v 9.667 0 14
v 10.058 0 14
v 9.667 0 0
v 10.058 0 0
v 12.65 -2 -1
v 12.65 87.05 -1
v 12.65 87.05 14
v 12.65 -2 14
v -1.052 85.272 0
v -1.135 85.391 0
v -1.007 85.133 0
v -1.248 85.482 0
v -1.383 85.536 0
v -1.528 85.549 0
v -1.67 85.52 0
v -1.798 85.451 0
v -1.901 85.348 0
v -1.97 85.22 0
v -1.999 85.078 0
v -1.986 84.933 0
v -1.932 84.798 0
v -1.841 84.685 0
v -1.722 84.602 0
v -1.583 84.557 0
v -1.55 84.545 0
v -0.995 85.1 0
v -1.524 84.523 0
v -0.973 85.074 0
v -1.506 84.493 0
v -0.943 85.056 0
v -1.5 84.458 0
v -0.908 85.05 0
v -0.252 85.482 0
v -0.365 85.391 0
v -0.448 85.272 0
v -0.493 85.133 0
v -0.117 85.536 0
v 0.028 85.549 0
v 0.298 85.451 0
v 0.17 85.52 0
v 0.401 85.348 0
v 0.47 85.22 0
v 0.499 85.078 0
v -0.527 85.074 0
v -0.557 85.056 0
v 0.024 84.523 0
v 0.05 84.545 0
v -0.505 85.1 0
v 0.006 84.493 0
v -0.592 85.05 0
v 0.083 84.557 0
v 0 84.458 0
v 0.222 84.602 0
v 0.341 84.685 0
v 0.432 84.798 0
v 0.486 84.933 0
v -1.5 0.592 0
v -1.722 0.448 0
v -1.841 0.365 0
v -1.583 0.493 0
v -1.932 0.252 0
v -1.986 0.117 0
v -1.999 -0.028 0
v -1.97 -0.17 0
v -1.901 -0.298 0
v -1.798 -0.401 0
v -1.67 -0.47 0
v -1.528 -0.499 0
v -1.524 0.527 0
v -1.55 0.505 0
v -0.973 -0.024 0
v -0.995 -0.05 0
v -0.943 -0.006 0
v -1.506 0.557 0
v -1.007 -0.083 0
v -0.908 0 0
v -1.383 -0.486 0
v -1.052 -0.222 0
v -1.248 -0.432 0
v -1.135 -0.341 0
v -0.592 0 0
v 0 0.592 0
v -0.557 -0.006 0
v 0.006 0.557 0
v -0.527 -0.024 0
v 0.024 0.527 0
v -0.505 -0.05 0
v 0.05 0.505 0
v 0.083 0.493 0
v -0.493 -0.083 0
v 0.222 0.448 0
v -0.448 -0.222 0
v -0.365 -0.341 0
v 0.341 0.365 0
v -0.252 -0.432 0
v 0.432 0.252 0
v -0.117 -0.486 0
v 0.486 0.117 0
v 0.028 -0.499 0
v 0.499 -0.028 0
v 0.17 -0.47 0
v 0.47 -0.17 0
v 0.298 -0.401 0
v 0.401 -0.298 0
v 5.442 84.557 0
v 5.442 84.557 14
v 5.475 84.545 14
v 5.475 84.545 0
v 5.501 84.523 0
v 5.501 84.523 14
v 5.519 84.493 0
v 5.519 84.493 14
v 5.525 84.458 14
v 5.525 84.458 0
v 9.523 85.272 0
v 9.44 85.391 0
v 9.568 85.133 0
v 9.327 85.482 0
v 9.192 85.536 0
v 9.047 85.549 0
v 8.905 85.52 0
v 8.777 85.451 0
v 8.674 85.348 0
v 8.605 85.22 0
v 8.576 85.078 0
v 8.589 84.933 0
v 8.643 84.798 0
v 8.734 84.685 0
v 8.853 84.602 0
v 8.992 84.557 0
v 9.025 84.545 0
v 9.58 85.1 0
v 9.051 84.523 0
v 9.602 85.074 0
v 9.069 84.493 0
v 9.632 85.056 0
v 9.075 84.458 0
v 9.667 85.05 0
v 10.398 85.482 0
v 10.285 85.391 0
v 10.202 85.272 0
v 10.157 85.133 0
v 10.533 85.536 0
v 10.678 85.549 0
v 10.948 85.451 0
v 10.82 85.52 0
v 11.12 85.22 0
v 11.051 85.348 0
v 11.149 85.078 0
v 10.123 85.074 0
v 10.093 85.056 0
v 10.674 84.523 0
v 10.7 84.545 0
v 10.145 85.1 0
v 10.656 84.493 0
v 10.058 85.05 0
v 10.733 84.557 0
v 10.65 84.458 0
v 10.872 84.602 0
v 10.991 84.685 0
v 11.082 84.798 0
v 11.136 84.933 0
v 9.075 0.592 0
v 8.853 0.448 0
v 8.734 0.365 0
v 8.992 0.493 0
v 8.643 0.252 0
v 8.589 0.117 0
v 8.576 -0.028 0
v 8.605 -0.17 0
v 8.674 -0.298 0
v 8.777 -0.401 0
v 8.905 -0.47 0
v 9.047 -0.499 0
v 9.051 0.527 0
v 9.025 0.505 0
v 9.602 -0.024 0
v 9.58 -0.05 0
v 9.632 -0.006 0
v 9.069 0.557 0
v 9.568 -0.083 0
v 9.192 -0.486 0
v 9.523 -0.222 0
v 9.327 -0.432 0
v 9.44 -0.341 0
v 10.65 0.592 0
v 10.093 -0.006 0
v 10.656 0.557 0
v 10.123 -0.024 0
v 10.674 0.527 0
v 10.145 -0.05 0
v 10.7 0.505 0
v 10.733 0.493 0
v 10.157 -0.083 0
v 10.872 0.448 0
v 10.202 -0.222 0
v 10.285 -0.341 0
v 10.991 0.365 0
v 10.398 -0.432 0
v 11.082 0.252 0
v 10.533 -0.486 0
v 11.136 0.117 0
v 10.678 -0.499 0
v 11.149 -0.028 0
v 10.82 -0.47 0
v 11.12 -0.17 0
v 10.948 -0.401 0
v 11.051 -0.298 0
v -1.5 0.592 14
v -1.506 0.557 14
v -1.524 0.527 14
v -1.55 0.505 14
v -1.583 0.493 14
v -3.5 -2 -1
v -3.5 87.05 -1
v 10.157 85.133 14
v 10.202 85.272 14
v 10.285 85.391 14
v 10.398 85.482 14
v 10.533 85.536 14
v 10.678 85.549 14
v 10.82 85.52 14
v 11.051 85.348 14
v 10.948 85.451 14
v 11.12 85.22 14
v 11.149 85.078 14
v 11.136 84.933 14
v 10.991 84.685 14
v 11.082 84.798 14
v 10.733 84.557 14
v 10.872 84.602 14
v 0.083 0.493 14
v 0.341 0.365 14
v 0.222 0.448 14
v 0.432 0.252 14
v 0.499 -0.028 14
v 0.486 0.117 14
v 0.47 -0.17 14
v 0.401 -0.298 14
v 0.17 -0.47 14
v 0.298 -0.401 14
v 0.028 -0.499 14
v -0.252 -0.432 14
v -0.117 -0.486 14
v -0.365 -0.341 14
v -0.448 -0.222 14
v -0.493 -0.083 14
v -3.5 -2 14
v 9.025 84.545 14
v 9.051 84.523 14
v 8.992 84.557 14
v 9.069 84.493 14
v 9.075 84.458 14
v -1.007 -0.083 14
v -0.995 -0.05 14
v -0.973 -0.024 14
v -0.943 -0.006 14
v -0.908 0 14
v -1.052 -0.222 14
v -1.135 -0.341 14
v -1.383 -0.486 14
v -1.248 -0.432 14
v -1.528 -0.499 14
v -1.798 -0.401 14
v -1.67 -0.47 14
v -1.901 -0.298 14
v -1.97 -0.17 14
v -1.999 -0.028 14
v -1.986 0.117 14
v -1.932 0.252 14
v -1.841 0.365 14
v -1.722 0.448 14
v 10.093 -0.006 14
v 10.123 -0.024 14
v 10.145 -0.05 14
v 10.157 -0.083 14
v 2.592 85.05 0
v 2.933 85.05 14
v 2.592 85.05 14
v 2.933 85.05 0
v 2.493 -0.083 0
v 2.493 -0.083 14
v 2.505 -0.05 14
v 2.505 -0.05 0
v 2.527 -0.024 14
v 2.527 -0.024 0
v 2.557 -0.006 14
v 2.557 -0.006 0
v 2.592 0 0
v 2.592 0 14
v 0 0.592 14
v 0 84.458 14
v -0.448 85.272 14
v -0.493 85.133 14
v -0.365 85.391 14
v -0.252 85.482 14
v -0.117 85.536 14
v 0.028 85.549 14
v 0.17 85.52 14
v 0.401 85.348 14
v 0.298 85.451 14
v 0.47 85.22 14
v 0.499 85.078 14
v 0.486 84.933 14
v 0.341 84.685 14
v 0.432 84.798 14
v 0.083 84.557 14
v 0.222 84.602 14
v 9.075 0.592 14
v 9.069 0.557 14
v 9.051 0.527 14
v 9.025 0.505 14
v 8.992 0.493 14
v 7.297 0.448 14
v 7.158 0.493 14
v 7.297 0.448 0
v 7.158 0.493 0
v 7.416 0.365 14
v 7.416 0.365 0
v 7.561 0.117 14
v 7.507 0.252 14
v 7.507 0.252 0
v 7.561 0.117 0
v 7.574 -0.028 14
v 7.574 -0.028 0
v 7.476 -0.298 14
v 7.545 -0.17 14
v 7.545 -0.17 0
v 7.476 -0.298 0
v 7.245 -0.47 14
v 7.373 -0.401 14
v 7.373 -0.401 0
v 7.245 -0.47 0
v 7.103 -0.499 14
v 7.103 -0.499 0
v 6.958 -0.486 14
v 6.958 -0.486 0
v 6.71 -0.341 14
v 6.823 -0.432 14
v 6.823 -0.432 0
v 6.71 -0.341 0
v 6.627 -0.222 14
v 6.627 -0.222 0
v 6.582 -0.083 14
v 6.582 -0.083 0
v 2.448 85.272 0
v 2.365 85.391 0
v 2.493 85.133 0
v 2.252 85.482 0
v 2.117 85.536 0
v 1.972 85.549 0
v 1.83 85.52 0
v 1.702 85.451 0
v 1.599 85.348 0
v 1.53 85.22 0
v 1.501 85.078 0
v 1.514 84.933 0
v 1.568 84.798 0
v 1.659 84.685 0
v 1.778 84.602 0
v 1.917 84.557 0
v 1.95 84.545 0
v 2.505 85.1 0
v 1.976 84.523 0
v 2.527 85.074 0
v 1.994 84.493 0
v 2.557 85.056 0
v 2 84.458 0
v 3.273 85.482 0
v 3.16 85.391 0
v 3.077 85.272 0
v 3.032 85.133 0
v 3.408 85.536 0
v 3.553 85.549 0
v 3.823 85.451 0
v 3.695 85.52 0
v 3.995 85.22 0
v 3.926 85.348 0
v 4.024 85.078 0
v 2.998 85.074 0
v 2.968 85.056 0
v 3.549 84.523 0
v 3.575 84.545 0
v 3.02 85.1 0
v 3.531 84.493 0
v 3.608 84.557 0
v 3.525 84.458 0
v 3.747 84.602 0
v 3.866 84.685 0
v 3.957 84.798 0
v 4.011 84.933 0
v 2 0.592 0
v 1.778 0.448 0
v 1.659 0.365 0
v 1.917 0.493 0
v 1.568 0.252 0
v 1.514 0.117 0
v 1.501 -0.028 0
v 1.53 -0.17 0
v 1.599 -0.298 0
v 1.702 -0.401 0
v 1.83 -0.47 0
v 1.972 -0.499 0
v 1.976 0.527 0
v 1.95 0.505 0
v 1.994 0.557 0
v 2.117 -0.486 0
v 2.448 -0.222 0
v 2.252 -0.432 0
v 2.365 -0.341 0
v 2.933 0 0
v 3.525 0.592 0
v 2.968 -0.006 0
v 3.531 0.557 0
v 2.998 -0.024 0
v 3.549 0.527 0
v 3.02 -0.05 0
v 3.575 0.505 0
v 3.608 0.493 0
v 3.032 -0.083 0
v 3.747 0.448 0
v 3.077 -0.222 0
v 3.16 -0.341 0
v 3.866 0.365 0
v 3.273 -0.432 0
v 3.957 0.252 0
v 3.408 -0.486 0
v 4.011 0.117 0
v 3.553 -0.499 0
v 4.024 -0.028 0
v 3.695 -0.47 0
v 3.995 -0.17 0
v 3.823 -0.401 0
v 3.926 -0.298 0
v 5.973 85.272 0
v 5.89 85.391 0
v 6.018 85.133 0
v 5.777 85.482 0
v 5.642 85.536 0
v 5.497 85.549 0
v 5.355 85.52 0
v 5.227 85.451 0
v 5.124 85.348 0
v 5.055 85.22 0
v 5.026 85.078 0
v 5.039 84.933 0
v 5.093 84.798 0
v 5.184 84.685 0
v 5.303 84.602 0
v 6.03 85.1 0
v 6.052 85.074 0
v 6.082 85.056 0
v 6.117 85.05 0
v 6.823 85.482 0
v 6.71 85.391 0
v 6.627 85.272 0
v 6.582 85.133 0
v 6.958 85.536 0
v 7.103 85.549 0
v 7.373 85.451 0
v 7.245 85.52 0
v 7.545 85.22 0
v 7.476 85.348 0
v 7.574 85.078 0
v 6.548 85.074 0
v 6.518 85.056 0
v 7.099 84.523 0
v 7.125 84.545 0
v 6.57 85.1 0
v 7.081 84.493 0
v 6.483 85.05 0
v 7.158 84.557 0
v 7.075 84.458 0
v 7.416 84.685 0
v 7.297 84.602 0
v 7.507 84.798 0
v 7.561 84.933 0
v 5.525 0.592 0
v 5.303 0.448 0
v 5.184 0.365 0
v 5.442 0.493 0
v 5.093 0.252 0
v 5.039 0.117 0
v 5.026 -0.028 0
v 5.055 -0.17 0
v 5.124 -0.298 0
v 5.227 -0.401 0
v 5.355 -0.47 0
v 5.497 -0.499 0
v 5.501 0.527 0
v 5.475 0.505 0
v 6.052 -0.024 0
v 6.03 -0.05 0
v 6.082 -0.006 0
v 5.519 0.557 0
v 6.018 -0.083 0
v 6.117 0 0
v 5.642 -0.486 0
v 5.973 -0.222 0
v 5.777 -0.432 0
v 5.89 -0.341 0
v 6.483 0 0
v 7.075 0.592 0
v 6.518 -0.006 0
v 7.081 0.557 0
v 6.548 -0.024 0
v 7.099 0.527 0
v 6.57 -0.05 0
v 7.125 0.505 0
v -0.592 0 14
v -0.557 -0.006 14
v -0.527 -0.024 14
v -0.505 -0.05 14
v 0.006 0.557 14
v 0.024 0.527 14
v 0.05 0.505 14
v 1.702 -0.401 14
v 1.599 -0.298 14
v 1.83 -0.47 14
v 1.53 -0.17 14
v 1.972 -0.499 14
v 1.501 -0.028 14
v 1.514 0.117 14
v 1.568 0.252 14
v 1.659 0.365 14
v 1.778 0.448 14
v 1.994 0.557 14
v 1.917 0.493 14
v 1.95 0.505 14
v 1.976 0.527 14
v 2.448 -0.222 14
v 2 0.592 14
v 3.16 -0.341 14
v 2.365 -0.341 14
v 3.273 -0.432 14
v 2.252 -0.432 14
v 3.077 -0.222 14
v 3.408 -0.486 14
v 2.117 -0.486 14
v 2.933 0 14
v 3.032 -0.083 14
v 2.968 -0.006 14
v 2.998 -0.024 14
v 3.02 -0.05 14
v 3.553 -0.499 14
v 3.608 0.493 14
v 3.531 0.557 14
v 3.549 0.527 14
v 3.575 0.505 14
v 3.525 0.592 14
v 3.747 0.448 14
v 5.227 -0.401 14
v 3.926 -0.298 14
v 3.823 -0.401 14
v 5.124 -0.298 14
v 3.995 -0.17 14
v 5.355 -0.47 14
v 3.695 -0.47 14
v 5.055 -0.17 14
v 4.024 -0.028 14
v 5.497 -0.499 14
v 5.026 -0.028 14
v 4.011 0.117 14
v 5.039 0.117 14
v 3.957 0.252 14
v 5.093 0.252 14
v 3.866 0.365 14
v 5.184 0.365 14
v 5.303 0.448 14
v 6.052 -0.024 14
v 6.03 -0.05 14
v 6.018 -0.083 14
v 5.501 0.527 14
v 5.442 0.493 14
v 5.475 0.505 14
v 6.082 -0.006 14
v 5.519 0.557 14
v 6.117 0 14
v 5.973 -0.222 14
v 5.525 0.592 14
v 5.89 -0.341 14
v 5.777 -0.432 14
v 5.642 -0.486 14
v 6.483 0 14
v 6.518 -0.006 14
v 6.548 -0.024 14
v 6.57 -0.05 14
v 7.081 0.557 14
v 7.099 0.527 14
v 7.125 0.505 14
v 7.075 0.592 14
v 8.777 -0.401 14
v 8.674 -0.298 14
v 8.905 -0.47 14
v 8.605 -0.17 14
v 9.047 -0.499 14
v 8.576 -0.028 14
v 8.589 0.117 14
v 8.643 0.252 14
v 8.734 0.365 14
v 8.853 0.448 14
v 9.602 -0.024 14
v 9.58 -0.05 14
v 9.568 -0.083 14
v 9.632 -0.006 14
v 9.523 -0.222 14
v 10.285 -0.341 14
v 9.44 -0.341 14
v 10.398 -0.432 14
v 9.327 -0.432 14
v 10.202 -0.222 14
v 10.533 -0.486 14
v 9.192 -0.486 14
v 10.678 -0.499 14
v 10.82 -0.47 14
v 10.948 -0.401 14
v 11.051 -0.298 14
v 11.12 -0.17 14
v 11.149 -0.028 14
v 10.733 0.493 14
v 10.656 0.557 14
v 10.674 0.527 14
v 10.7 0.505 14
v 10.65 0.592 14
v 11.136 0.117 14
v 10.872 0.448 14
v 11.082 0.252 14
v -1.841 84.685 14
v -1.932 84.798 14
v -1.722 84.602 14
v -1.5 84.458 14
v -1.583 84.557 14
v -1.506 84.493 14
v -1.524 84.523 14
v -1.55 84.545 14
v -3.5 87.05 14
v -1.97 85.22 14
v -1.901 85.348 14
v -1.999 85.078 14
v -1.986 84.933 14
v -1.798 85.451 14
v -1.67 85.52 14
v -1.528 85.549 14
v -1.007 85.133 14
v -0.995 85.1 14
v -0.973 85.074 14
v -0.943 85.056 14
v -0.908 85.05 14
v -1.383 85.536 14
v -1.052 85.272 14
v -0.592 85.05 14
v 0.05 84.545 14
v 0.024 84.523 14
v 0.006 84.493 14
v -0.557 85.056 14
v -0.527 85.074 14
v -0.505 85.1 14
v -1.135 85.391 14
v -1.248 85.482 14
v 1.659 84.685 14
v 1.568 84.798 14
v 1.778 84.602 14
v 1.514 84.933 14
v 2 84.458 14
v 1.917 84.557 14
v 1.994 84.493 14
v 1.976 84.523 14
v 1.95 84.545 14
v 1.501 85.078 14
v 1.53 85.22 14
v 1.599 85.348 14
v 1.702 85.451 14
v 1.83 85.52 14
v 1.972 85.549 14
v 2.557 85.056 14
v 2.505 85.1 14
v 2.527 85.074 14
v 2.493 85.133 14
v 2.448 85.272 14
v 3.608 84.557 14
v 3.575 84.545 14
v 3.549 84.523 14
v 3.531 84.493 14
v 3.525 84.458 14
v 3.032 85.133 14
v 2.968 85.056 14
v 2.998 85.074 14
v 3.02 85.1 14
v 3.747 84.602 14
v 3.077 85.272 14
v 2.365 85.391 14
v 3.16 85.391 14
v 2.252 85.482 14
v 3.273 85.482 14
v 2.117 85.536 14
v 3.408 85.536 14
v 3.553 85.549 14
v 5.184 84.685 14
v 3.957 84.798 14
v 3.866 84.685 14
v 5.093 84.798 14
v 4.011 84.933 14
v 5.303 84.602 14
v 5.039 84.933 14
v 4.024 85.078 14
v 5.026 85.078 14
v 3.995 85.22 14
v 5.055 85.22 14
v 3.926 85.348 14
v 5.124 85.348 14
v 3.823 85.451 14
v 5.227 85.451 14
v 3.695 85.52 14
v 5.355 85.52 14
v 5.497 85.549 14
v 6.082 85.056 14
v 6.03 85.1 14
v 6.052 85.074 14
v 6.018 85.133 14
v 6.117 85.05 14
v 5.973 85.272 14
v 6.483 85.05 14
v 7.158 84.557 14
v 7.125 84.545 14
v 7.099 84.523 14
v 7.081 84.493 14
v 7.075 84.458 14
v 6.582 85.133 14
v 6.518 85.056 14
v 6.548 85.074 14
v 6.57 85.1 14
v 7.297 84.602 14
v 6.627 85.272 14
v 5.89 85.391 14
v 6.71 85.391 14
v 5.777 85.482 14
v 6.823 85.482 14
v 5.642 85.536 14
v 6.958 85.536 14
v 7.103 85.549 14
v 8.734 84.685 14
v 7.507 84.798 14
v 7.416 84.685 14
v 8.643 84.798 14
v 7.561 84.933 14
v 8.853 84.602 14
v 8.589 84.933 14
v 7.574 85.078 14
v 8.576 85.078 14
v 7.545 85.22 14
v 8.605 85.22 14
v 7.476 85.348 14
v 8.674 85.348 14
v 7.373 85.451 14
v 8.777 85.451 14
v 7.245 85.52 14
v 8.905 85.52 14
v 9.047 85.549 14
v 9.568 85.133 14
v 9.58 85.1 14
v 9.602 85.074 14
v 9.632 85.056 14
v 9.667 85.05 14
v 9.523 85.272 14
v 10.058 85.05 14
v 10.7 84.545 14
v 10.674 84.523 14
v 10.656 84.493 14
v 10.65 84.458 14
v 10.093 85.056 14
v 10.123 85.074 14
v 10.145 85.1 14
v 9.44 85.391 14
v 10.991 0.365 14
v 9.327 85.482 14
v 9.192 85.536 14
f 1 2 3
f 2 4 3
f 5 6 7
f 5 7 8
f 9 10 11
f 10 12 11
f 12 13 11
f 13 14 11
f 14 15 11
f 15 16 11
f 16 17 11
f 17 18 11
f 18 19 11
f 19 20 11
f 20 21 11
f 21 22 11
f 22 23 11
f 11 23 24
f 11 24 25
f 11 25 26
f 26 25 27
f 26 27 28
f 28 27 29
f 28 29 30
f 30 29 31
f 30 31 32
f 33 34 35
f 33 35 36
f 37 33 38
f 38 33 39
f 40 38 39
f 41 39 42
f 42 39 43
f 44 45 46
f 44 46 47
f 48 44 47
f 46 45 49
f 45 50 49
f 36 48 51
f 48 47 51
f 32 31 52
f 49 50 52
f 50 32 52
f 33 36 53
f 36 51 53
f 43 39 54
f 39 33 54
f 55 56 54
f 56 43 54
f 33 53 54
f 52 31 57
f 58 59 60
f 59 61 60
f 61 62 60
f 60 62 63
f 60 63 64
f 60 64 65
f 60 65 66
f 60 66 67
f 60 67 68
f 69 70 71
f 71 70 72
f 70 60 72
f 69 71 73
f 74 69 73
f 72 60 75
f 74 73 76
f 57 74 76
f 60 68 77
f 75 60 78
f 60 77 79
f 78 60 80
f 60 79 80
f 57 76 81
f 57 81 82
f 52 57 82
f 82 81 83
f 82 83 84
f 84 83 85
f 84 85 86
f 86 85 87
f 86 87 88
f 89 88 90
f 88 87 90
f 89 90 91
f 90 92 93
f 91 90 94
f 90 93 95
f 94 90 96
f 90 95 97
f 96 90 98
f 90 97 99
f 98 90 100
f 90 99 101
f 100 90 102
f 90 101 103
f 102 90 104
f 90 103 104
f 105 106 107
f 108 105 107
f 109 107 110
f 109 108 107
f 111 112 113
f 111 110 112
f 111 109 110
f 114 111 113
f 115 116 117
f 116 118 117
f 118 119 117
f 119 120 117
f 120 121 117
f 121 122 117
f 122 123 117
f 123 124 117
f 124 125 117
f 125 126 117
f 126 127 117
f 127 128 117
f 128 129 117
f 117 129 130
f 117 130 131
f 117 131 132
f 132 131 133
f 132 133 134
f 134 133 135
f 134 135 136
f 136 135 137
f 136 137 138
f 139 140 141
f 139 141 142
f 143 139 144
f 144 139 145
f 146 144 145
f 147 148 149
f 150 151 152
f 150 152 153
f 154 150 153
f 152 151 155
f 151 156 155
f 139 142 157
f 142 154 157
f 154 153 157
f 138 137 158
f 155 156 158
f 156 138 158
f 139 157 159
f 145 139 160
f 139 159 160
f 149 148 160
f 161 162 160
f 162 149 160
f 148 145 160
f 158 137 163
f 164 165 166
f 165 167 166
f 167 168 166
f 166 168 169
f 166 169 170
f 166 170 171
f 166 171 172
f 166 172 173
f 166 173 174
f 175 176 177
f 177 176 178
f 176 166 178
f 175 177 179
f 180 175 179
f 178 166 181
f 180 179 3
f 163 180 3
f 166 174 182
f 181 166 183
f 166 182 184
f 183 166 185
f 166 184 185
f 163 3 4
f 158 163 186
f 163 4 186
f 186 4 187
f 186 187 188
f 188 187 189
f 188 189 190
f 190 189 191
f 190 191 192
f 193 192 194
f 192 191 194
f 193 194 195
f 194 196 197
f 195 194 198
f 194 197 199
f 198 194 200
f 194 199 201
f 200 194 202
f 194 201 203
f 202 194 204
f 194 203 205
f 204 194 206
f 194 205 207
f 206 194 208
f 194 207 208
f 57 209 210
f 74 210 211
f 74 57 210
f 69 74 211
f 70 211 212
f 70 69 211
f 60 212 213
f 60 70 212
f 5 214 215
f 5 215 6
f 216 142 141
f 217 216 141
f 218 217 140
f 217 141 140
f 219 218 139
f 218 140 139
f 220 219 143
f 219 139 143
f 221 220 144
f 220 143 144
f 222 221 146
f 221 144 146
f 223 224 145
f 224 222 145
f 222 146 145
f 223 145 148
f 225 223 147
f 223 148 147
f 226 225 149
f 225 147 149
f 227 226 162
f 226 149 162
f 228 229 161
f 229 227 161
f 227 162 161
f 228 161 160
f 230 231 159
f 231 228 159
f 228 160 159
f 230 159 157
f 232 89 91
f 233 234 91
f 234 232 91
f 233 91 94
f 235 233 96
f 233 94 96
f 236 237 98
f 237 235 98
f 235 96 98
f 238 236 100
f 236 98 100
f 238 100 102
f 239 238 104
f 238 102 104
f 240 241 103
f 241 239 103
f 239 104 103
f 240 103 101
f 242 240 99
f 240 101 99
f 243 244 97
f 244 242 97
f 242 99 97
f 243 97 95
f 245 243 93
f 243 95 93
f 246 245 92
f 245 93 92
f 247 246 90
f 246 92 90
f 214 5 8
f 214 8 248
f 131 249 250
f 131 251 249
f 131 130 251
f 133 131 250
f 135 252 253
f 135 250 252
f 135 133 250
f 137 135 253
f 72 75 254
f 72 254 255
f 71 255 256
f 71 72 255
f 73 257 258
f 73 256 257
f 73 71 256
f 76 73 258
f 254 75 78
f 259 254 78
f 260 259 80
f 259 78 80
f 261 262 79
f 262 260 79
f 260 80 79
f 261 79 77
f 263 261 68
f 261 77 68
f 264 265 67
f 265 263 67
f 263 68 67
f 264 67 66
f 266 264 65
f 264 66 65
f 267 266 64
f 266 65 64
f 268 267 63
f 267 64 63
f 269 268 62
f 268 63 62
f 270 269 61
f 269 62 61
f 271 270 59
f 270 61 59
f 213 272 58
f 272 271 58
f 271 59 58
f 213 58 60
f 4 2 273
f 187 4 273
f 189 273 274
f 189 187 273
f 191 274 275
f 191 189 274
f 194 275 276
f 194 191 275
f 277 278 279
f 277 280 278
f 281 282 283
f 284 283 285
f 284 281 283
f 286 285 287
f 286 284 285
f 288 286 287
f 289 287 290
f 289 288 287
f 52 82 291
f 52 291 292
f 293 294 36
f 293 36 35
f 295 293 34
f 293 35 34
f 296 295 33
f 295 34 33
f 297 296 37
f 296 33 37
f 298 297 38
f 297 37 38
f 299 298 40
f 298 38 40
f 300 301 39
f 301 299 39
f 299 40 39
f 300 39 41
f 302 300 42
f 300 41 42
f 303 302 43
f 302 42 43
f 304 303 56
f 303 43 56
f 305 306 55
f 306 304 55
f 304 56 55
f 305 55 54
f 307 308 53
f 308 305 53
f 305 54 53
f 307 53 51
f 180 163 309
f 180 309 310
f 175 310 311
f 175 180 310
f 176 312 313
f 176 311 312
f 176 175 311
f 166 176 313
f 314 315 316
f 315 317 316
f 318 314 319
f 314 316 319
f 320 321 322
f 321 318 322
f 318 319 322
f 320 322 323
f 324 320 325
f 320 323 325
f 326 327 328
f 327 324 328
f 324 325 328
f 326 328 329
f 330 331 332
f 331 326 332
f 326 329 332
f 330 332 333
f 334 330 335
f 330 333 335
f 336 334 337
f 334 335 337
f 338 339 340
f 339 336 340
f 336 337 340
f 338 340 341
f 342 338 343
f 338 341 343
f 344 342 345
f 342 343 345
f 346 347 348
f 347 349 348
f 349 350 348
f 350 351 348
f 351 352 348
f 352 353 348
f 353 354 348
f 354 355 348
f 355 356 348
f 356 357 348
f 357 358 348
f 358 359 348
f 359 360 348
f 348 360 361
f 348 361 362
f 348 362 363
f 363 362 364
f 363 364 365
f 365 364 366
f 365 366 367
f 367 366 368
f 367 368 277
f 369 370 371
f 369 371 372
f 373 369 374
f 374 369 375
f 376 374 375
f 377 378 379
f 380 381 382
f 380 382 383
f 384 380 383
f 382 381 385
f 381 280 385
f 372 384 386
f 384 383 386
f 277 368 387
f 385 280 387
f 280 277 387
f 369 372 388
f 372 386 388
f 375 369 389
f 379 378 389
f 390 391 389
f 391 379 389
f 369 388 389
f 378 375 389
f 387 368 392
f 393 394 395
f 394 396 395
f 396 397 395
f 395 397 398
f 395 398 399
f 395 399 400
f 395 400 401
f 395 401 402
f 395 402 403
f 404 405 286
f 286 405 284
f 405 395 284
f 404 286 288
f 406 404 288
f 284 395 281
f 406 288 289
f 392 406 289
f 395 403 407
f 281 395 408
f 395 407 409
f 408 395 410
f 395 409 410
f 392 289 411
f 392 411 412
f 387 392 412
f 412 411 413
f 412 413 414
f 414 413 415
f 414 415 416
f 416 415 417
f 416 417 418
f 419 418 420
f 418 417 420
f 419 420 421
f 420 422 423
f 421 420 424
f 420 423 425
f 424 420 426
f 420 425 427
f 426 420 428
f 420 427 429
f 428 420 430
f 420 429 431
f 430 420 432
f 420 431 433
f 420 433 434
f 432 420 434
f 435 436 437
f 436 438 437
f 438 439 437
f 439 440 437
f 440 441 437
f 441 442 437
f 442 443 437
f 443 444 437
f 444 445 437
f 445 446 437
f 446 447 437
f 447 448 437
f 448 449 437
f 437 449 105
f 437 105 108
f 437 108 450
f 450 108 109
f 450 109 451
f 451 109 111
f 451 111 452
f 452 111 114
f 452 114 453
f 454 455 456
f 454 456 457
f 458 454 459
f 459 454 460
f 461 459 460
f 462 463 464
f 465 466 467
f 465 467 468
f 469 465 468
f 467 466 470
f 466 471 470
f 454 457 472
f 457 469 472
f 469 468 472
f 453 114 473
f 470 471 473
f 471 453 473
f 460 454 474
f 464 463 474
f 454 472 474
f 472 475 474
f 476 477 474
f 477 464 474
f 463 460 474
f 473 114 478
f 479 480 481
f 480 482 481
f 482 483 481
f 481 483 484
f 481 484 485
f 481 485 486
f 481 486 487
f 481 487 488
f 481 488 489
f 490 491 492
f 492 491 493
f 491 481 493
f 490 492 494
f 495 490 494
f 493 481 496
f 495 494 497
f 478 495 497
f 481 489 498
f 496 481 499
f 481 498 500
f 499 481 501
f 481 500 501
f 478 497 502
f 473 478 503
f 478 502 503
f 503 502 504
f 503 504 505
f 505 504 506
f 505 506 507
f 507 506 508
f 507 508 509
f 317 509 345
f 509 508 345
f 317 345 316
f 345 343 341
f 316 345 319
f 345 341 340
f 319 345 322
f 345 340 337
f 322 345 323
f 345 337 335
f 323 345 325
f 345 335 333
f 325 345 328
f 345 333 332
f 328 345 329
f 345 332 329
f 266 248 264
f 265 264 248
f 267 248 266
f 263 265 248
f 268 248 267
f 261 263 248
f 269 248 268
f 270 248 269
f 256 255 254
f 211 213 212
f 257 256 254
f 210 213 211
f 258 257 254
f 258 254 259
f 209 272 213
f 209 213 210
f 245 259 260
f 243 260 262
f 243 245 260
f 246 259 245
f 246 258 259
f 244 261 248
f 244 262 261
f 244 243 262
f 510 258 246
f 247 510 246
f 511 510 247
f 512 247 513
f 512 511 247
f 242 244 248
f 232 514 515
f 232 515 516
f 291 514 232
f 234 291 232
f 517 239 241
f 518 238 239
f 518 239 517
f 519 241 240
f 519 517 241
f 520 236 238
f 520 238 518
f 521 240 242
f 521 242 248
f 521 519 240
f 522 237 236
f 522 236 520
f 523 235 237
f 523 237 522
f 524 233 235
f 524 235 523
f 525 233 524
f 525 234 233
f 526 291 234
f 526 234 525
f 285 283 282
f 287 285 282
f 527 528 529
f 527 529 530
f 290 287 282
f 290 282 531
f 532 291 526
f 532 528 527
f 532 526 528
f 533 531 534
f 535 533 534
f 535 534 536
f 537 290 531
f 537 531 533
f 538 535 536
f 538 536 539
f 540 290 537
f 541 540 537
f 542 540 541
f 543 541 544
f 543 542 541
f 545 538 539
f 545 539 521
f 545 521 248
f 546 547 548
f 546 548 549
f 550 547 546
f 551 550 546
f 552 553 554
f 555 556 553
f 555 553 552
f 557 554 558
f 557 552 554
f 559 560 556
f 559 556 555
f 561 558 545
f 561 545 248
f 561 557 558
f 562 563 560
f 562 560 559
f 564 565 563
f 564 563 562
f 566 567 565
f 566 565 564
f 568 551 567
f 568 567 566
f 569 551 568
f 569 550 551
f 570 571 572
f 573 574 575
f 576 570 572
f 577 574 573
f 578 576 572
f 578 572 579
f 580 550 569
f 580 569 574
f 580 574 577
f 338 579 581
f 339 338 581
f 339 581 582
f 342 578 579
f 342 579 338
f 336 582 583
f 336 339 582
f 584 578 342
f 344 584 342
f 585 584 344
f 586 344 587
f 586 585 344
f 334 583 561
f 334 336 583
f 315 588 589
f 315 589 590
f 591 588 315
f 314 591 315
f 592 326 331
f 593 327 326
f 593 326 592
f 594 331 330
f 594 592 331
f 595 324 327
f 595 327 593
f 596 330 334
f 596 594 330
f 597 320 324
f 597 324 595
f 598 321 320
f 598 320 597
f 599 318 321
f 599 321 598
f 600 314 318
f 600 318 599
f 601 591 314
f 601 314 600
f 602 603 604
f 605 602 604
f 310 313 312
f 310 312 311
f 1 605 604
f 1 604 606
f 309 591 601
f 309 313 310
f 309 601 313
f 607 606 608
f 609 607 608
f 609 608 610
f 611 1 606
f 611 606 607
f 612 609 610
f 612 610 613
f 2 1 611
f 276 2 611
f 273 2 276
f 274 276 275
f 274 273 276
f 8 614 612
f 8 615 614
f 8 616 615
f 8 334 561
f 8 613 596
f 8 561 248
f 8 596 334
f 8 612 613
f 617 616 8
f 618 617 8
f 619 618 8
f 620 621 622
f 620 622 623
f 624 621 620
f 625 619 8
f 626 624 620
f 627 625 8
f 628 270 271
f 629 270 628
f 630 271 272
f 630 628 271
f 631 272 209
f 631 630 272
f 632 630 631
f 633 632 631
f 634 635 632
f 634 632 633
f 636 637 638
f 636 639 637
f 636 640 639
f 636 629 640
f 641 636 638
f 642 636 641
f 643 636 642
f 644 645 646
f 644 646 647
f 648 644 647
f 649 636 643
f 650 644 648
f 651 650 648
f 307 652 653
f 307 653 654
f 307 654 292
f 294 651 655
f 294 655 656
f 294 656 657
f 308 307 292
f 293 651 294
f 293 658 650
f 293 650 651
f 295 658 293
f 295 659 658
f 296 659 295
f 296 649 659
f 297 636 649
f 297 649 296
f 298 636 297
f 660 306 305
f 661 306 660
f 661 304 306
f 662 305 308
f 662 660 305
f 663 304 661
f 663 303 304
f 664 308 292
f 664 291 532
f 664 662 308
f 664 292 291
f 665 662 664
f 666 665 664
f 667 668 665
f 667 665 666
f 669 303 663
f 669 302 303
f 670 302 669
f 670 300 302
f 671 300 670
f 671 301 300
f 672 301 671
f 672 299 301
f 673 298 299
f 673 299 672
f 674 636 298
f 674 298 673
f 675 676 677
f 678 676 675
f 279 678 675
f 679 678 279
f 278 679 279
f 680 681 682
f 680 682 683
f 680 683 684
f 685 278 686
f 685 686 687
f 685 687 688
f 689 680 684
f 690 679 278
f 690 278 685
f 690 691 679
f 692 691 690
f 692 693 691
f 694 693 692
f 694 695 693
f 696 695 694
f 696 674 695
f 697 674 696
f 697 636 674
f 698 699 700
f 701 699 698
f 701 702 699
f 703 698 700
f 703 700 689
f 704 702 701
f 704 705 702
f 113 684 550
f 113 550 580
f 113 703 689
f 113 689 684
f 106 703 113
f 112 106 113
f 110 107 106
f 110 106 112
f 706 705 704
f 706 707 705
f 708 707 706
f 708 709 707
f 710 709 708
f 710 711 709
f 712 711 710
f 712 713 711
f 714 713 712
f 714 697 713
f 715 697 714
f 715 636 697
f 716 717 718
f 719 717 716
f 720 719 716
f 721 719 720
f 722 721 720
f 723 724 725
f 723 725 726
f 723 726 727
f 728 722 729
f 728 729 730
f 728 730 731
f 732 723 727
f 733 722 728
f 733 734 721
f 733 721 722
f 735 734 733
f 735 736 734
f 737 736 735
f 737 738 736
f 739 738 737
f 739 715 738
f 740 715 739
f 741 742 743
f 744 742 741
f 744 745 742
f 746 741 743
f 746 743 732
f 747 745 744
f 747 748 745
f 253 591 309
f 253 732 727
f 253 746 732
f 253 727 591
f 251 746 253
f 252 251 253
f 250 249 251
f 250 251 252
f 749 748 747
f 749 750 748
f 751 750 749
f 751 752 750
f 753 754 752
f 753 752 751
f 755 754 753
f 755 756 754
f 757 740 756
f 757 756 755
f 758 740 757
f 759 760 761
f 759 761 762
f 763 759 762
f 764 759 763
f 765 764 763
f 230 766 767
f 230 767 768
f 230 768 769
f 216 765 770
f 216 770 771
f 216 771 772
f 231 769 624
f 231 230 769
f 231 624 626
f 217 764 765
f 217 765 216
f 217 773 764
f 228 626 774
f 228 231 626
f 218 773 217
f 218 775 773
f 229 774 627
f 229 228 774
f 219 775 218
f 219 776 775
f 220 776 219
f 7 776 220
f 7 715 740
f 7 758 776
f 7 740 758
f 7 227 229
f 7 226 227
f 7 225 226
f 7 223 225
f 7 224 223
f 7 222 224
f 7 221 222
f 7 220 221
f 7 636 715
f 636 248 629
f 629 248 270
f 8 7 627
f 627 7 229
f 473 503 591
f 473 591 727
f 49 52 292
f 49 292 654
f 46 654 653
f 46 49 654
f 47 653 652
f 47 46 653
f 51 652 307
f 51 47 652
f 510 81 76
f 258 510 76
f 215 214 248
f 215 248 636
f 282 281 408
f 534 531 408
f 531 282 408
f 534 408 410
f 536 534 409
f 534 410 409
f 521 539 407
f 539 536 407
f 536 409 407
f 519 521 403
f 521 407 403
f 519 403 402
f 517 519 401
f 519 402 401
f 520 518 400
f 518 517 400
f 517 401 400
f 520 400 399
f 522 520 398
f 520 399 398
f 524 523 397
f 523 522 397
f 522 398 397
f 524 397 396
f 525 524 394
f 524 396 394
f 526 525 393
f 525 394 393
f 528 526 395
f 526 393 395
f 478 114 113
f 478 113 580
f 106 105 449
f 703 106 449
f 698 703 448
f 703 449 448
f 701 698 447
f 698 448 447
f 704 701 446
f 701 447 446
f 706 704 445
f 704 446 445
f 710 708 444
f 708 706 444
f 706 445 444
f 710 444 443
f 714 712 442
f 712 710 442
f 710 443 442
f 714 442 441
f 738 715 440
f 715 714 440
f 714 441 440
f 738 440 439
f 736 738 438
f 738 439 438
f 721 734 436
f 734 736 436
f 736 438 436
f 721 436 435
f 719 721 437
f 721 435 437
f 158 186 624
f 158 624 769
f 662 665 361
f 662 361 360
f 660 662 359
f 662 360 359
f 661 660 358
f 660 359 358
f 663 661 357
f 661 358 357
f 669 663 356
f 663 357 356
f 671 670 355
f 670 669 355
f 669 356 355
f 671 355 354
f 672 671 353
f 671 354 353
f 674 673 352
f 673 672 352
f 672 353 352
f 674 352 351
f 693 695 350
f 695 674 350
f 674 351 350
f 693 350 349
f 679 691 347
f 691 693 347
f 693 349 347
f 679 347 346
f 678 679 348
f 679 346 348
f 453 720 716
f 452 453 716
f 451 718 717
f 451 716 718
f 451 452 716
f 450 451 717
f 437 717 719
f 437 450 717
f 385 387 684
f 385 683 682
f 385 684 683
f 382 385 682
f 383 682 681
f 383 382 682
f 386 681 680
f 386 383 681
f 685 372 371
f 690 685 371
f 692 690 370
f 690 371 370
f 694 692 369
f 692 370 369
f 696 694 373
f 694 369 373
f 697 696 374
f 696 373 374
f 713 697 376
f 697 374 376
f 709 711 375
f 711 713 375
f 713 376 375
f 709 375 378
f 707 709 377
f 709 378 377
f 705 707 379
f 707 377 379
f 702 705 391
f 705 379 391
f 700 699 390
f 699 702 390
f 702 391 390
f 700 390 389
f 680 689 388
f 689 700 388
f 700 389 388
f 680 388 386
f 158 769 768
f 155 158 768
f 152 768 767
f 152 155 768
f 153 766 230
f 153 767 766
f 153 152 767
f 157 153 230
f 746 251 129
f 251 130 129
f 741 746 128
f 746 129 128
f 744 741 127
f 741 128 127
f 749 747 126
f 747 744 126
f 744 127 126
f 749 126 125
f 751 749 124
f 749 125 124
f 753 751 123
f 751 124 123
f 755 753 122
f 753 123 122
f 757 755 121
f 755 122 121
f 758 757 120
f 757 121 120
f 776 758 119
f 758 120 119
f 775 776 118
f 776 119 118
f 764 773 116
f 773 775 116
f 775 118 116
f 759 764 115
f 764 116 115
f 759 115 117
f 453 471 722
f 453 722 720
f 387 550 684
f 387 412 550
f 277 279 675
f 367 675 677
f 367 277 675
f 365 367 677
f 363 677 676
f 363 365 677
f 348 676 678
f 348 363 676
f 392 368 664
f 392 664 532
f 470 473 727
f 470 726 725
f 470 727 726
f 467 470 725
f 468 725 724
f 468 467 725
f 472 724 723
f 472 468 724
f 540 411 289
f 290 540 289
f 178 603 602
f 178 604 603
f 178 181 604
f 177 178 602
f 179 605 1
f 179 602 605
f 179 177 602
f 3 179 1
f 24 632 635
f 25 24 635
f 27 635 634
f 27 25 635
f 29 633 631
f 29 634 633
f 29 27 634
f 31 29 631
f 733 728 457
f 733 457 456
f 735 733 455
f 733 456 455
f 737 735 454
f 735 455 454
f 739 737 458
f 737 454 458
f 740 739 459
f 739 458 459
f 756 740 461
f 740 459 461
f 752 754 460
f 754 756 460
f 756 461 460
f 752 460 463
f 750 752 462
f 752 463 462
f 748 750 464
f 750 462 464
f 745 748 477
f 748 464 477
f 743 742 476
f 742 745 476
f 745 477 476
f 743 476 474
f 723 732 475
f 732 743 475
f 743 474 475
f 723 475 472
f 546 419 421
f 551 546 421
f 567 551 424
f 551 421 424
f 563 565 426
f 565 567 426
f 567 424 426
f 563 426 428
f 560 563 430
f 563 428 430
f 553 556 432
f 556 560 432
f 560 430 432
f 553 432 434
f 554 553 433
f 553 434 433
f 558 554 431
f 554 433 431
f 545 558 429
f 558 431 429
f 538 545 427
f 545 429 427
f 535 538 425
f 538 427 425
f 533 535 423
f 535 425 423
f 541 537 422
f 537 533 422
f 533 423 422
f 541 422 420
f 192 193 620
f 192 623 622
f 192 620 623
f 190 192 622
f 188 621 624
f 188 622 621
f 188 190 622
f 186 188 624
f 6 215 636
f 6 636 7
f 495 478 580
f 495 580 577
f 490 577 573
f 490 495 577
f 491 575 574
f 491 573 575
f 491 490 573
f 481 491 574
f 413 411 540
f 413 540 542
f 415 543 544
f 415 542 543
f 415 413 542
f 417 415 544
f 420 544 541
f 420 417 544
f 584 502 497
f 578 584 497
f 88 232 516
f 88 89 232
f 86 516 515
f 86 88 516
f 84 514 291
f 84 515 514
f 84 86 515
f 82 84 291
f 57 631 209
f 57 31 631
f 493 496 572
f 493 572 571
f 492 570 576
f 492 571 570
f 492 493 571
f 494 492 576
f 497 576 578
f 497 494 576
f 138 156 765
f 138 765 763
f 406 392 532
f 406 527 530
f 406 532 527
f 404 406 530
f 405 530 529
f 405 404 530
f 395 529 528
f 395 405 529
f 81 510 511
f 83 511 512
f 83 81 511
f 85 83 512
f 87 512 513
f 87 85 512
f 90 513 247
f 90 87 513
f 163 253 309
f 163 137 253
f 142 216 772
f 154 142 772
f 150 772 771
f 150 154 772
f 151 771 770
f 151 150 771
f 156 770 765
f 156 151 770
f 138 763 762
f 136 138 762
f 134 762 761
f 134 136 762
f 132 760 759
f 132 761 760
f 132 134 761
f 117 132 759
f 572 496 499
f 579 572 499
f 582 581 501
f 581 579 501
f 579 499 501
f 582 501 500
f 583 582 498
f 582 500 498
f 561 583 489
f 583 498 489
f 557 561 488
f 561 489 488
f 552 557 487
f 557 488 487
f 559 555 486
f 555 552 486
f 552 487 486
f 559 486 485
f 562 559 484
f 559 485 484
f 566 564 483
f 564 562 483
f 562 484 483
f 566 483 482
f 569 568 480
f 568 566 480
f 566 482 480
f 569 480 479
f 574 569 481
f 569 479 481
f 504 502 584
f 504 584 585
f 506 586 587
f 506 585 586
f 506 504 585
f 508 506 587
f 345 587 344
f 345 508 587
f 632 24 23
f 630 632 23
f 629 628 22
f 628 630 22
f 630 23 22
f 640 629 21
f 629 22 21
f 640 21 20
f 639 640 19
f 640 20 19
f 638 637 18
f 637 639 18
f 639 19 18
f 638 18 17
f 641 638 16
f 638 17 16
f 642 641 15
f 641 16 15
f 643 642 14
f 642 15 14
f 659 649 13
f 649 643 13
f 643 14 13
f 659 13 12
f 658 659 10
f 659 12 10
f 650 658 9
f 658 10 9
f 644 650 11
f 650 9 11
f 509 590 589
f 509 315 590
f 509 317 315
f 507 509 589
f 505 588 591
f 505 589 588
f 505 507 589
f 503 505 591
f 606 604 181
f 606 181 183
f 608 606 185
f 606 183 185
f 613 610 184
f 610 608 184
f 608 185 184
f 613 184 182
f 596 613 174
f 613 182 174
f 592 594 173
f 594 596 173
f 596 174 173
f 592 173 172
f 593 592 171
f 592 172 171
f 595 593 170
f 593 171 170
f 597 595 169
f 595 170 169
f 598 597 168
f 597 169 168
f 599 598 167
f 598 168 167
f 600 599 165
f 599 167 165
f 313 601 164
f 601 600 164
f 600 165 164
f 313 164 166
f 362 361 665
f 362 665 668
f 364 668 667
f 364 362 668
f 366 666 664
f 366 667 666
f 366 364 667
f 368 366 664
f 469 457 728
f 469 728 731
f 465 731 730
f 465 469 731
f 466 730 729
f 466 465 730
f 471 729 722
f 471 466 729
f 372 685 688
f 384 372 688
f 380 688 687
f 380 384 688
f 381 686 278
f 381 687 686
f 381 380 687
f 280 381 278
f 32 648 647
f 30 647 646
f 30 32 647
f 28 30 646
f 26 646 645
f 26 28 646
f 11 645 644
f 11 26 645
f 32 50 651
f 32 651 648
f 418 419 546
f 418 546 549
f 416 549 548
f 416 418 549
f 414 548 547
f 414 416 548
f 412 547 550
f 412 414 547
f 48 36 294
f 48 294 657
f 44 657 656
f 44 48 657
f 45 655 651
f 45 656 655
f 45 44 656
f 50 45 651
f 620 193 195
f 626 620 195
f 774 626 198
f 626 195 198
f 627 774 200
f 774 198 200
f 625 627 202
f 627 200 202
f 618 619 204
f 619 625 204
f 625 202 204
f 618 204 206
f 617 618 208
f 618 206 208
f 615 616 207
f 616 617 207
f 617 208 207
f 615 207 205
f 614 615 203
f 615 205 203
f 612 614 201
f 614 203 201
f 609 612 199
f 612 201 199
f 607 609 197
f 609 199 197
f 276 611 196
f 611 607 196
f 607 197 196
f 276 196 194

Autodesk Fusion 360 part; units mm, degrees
sketch "Sketch1" plane through (0, 0, 0) normal (0, 0, 1) x (1, 0, 0)
  arc A0 (-0.5916, 85.05) -> (-0.493, 85.1333) centre (-0.5916, 85.15) ccw
  line L0 (-0.5916, 85.05) -> (-0.9084, 85.05)
  arc A1 (-1.007, 85.1333) -> (-1.5833, 84.557) centre (-1.5, 85.05) ccw
  arc A2 (0.0833, 84.557) -> (-0.493, 85.1333) centre (0, 85.05) ccw
  arc A3 (-1.007, 85.1333) -> (-0.9084, 85.05) centre (-0.9084, 85.15) ccw
  arc A4 (-1.5, 84.4584) -> (-1.5833, 84.557) centre (-1.6, 84.4584) ccw
  line L1 (-1.5, 84.4584) -> (-1.5, 0.5916)
  line L2 (0, 0.5916) -> (0, 84.4584)
  arc A5 (0.0833, 84.557) -> (0, 84.4584) centre (0.1, 84.4584) ccw
  line L3 (-1.5, 42.525) -> (0, 42.525) construction
  arc A6 (0, 0.5916) -> (0.0833, 0.493) centre (0.1, 0.5916) ccw
  arc A7 (-1.5833, 0.493) -> (-1.5, 0.5916) centre (-1.6, 0.5916) ccw
  arc A8 (-0.9084, 0) -> (-1.007, -0.0833) centre (-0.9084, -0.1) ccw
  arc A9 (-1.5833, 0.493) -> (-1.007, -0.0833) centre (-1.5, 0) ccw
  line L4 (-0.5916, 0) -> (-0.9084, 0)
  arc A10 (-0.493, -0.0833) -> (-0.5916, 0) centre (-0.5916, -0.1) ccw
  arc A11 (-0.493, -0.0833) -> (0.0833, 0.493) centre (0, 0) ccw
  line L5 (-3.5, 87.05) -> (12.65, 87.05)
  line L6 (12.65, 87.05) -> (12.65, -2)
  line L7 (12.65, -2) -> (-3.5, -2)
  line L8 (-3.5, -2) -> (-3.5, 87.05)
  line L9 (2.9334, 0) -> (2.5916, 0)
  line L10 (2, 84.4584) -> (2, 0.5916)
  arc A12 (3.6083, 84.557) -> (3.525, 84.4584) centre (3.625, 84.4584) ccw
  arc A13 (2.9334, 85.05) -> (3.032, 85.1333) centre (2.9334, 85.15) ccw
  arc A14 (1.9167, 0.493) -> (2.493, -0.0833) centre (2, 0) ccw
  arc A15 (2.493, 85.1333) -> (2.5916, 85.05) centre (2.5916, 85.15) ccw
  arc A16 (3.032, -0.0833) -> (3.6083, 0.493) centre (3.525, 0) ccw
  arc A17 (2, 84.4584) -> (1.9167, 84.557) centre (1.9, 84.4584) ccw
  arc A18 (3.525, 0.5916) -> (3.6083, 0.493) centre (3.625, 0.5916) ccw
  line L11 (2.9334, 85.05) -> (2.5916, 85.05)
  arc A19 (2.5916, 0) -> (2.493, -0.0833) centre (2.5916, -0.1) ccw
  line L12 (2, 42.525) -> (3.525, 42.525) construction
  arc A20 (2.493, 85.1333) -> (1.9167, 84.557) centre (2, 85.05) ccw
  arc A21 (3.6083, 84.557) -> (3.032, 85.1333) centre (3.525, 85.05) ccw
  arc A22 (3.032, -0.0833) -> (2.9334, 0) centre (2.9334, -0.1) ccw
  arc A23 (1.9167, 0.493) -> (2, 0.5916) centre (1.9, 0.5916) ccw
  line L13 (3.525, 0.5916) -> (3.525, 84.4584)
  arc A24 (5.4417, 0.493) -> (6.018, -0.0833) centre (5.525, 0) ccw
  line L14 (10.65, 0.5916) -> (10.65, 84.4584)
  line L15 (7.075, 0.5916) -> (7.075, 84.4584)
  line L16 (9.075, 42.525) -> (10.65, 42.525) construction
  arc A25 (9.568, 85.1333) -> (8.9917, 84.557) centre (9.075, 85.05) ccw
  line L17 (5.525, 84.4584) -> (5.525, 0.5916)
  arc A26 (6.582, -0.0833) -> (7.1583, 0.493) centre (7.075, 0) ccw
  arc A27 (10.157, -0.0833) -> (10.7333, 0.493) centre (10.65, 0) ccw
  arc A28 (6.018, 85.1333) -> (5.4417, 84.557) centre (5.525, 85.05) ccw
  line L18 (10.0584, 85.05) -> (9.6666, 85.05)
  arc A29 (8.9917, 0.493) -> (9.075, 0.5916) centre (8.975, 0.5916) ccw
  line L19 (6.4834, 0) -> (6.1166, 0)
  arc A30 (6.018, 85.1333) -> (6.1166, 85.05) centre (6.1166, 85.15) ccw
  arc A31 (9.568, 85.1333) -> (9.6666, 85.05) centre (9.6666, 85.15) ccw
  arc A32 (7.075, 0.5916) -> (7.1583, 0.493) centre (7.175, 0.5916) ccw
  line L20 (5.525, 42.525) -> (7.075, 42.525) construction
  arc A33 (6.1166, 0) -> (6.018, -0.0833) centre (6.1166, -0.1) ccw
  arc A34 (7.1583, 84.557) -> (7.075, 84.4584) centre (7.175, 84.4584) ccw
  line L21 (6.4834, 85.05) -> (6.1166, 85.05)
  arc A35 (9.075, 84.4584) -> (8.9917, 84.557) centre (8.975, 84.4584) ccw
  line L22 (9.075, 84.4584) -> (9.075, 0.5916)
  arc A36 (10.7333, 84.557) -> (10.65, 84.4584) centre (10.75, 84.4584) ccw
  arc A37 (6.582, -0.0833) -> (6.4834, 0) centre (6.4834, -0.1) ccw
  arc A38 (8.9917, 0.493) -> (9.568, -0.0833) centre (9.075, 0) ccw
  arc A39 (6.4834, 85.05) -> (6.582, 85.1333) centre (6.4834, 85.15) ccw
  arc A40 (7.1583, 84.557) -> (6.582, 85.1333) centre (7.075, 85.05) ccw
  arc A41 (9.6666, 0) -> (9.568, -0.0833) centre (9.6666, -0.1) ccw
  arc A42 (10.7333, 84.557) -> (10.157, 85.1333) centre (10.65, 85.05) ccw
  line L23 (10.0584, 0) -> (9.6666, 0)
  arc A43 (5.525, 84.4584) -> (5.4417, 84.557) centre (5.425, 84.4584) ccw
  arc A44 (10.65, 0.5916) -> (10.7333, 0.493) centre (10.75, 0.5916) ccw
  arc A45 (10.157, -0.0833) -> (10.0584, 0) centre (10.0584, -0.1) ccw
  arc A46 (5.4417, 0.493) -> (5.525, 0.5916) centre (5.425, 0.5916) ccw
  arc A47 (10.0584, 85.05) -> (10.157, 85.1333) centre (10.0584, 85.15) ccw
  arc A48 (9.568, 85.1333) -> (9.6666, 85.05) centre (9.6666, 85.15) ccw
  arc A49 (6.4834, 85.05) -> (6.582, 85.1333) centre (6.4834, 85.15) ccw
  arc A50 (10.0584, 85.05) -> (10.157, 85.1333) centre (10.0584, 85.15) ccw
  arc A51 (6.018, 85.1333) -> (5.4417, 84.557) centre (5.525, 85.05) ccw
  line L24 (10.0584, 85.05) -> (9.6666, 85.05)
  arc A52 (2.9334, 85.05) -> (3.032, 85.1333) centre (2.9334, 85.15) ccw
  arc A53 (10.7333, 84.557) -> (10.157, 85.1333) centre (10.65, 85.05) ccw
  arc A54 (6.018, 85.1333) -> (6.1166, 85.05) centre (6.1166, 85.15) ccw
  arc A55 (5.525, 84.4584) -> (5.4417, 84.557) centre (5.425, 84.4584) ccw
  arc A56 (2, 84.4584) -> (1.9167, 84.557) centre (1.9, 84.4584) ccw
  arc A57 (0.0833, 84.557) -> (0, 84.4584) centre (0.1, 84.4584) ccw
  arc A58 (10.7333, 84.557) -> (10.65, 84.4584) centre (10.75, 84.4584) ccw
  arc A59 (-1.007, 85.1333) -> (-1.5833, 84.557) centre (-1.5, 85.05) ccw
  line L25 (2.9334, 85.05) -> (2.5916, 85.05)
  arc A60 (3.6083, 84.557) -> (3.032, 85.1333) centre (3.525, 85.05) ccw
  arc A61 (-1.007, 85.1333) -> (-0.9084, 85.05) centre (-0.9084, 85.15) ccw
  arc A62 (7.1583, 84.557) -> (6.582, 85.1333) centre (7.075, 85.05) ccw
  arc A63 (2.493, 85.1333) -> (1.9167, 84.557) centre (2, 85.05) ccw
  arc A64 (9.075, 84.4584) -> (8.9917, 84.557) centre (8.975, 84.4584) ccw
  line L26 (-0.5916, 85.05) -> (-0.9084, 85.05)
  arc A65 (0.0833, 84.557) -> (-0.493, 85.1333) centre (0, 85.05) ccw
  arc A66 (-1.5, 84.4584) -> (-1.5833, 84.557) centre (-1.6, 84.4584) ccw
  arc A67 (-0.5916, 85.05) -> (-0.493, 85.1333) centre (-0.5916, 85.15) ccw
  arc A68 (7.1583, 84.557) -> (7.075, 84.4584) centre (7.175, 84.4584) ccw
  arc A69 (2.493, 85.1333) -> (2.5916, 85.05) centre (2.5916, 85.15) ccw
  line L27 (6.4834, 85.05) -> (6.1166, 85.05)
  arc A70 (3.6083, 84.557) -> (3.525, 84.4584) centre (3.625, 84.4584) ccw
  arc A71 (9.568, 85.1333) -> (8.9917, 84.557) centre (9.075, 85.05) ccw
  point P0 (-3.5, 87.05)
  point P1 (3.525, 0)
  point P2 (0.5, 87.05)
  point P3 (10.65, 0)
  point P4 (6.3, 0)
  dimension "d1" = 0.5
  dimension "d2" = 0.1
  dimension "d3" = 1.5
  dimension "d10" = 85.05
  dimension "d12" = 2
  dimension "d13" = 2
  dimension "d14" = 2
  dimension "d15" = 0.5
  dimension "d16" = 0.1
  dimension "d17" = 1.525
  dimension "d20" = 0.5
  dimension "d21" = 0.1
  dimension "d22" = 1.55
  dimension "d24" = 0.5
  dimension "d25" = 0.1
  dimension "d26" = 1.575
  dimension "d29" = 2
  dimension "d30" = 2
  dimension "d32" = 2
  dimension "d38" = 0.5
  dimension "d39" = 0.1
  dimension "d40" = 0.5
  dimension "d41" = 0.1
  dimension "d42" = 0.5
  dimension "d43" = 0.1
  dimension "d44" = 0.5
  dimension "d45" = 0.1
  dimension "d46" = 2
extrude "Extrude1" add sketch "Sketch1" along normal blind 14
sketch "Sketch2" plane through (0, 0, 0) normal (0, 0, -1) x (1, 0, 0)
  arc A0 (6.582, -85.1333) -> (7.1583, -84.557) centre (7.075, -85.05) ccw
  arc A1 (6.582, -85.1333) -> (6.4834, -85.05) centre (6.4834, -85.15) ccw
  line L0 (6.4834, -85.05) -> (6.1166, -85.05)
  arc A2 (6.1166, -85.05) -> (6.018, -85.1333) centre (6.1166, -85.15) ccw
  arc A3 (5.4417, -84.557) -> (6.018, -85.1333) centre (5.525, -85.05) ccw
  arc A4 (5.4417, -84.557) -> (5.525, -84.4584) centre (5.425, -84.4584) ccw
  line L1 (5.525, -84.4584) -> (5.525, -0.5916)
  arc A5 (5.525, -0.5916) -> (5.4417, -0.493) centre (5.425, -0.5916) ccw
  arc A6 (6.018, 0.0833) -> (5.4417, -0.493) centre (5.525, 0) ccw
  arc A7 (6.018, 0.0833) -> (6.1166, 0) centre (6.1166, 0.1) ccw
  line L2 (6.1166, 0) -> (6.4834, 0)
  arc A8 (6.4834, 0) -> (6.582, 0.0833) centre (6.4834, 0.1) ccw
  arc A9 (7.1583, -0.493) -> (6.582, 0.0833) centre (7.075, 0) ccw
  arc A10 (7.1583, -0.493) -> (7.075, -0.5916) centre (7.175, -0.5916) ccw
  line L3 (7.075, -0.5916) -> (7.075, -84.4584)
  arc A11 (7.075, -84.4584) -> (7.1583, -84.557) centre (7.175, -84.4584) ccw
  line L4 (10.0584, -85.05) -> (9.6666, -85.05)
  arc A12 (9.6666, -85.05) -> (9.568, -85.1333) centre (9.6666, -85.15) ccw
  arc A13 (8.9917, -84.557) -> (9.568, -85.1333) centre (9.075, -85.05) ccw
  arc A14 (8.9917, -84.557) -> (9.075, -84.4584) centre (8.975, -84.4584) ccw
  line L5 (9.075, -84.4584) -> (9.075, -0.5916)
  arc A15 (9.075, -0.5916) -> (8.9917, -0.493) centre (8.975, -0.5916) ccw
  arc A16 (9.568, 0.0833) -> (8.9917, -0.493) centre (9.075, 0) ccw
  arc A17 (9.568, 0.0833) -> (9.6666, 0) centre (9.6666, 0.1) ccw
  line L6 (9.6666, 0) -> (10.0584, 0)
  arc A18 (10.0584, 0) -> (10.157, 0.0833) centre (10.0584, 0.1) ccw
  arc A19 (10.7333, -0.493) -> (10.157, 0.0833) centre (10.65, 0) ccw
  arc A20 (10.7333, -0.493) -> (10.65, -0.5916) centre (10.75, -0.5916) ccw
  line L7 (10.65, -0.5916) -> (10.65, -84.4584)
  arc A21 (10.65, -84.4584) -> (10.7333, -84.557) centre (10.75, -84.4584) ccw
  arc A22 (10.157, -85.1333) -> (10.7333, -84.557) centre (10.65, -85.05) ccw
  arc A23 (10.157, -85.1333) -> (10.0584, -85.05) centre (10.0584, -85.15) ccw
  line L8 (2.9334, -85.05) -> (2.5916, -85.05)
  arc A24 (2.5916, -85.05) -> (2.493, -85.1333) centre (2.5916, -85.15) ccw
  arc A25 (1.9167, -84.557) -> (2.493, -85.1333) centre (2, -85.05) ccw
  arc A26 (1.9167, -84.557) -> (2, -84.4584) centre (1.9, -84.4584) ccw
  line L9 (2, -84.4584) -> (2, -0.5916)
  arc A27 (2, -0.5916) -> (1.9167, -0.493) centre (1.9, -0.5916) ccw
  arc A28 (2.493, 0.0833) -> (1.9167, -0.493) centre (2, 0) ccw
  arc A29 (2.493, 0.0833) -> (2.5916, 0) centre (2.5916, 0.1) ccw
  line L10 (2.5916, 0) -> (2.9334, 0)
  arc A30 (2.9334, 0) -> (3.032, 0.0833) centre (2.9334, 0.1) ccw
  arc A31 (3.6083, -0.493) -> (3.032, 0.0833) centre (3.525, 0) ccw
  arc A32 (3.6083, -0.493) -> (3.525, -0.5916) centre (3.625, -0.5916) ccw
  line L11 (3.525, -0.5916) -> (3.525, -84.4584)
  arc A33 (3.525, -84.4584) -> (3.6083, -84.557) centre (3.625, -84.4584) ccw
  arc A34 (3.032, -85.1333) -> (3.6083, -84.557) centre (3.525, -85.05) ccw
  arc A35 (3.032, -85.1333) -> (2.9334, -85.05) centre (2.9334, -85.15) ccw
  arc A36 (-1.5833, -84.557) -> (-1.007, -85.1333) centre (-1.5, -85.05) ccw
  arc A37 (-1.5833, -84.557) -> (-1.5, -84.4584) centre (-1.6, -84.4584) ccw
  line L12 (-1.5, -84.4584) -> (-1.5, -0.5916)
  arc A38 (-1.5, -0.5916) -> (-1.5833, -0.493) centre (-1.6, -0.5916) ccw
  arc A39 (-1.007, 0.0833) -> (-1.5833, -0.493) centre (-1.5, 0) ccw
  arc A40 (-1.007, 0.0833) -> (-0.9084, 0) centre (-0.9084, 0.1) ccw
  line L13 (-0.9084, 0) -> (-0.5916, 0)
  arc A41 (-0.5916, 0) -> (-0.493, 0.0833) centre (-0.5916, 0.1) ccw
  arc A42 (0.0833, -0.493) -> (-0.493, 0.0833) centre (0, 0) ccw
  arc A43 (0.0833, -0.493) -> (0, -0.5916) centre (0.1, -0.5916) ccw
  line L14 (0, -0.5916) -> (0, -84.4584)
  arc A44 (0, -84.4584) -> (0.0833, -84.557) centre (0.1, -84.4584) ccw
  arc A45 (-0.493, -85.1333) -> (0.0833, -84.557) centre (0, -85.05) ccw
  arc A46 (-0.493, -85.1333) -> (-0.5916, -85.05) centre (-0.5916, -85.15) ccw
  line L15 (-0.5916, -85.05) -> (-0.9084, -85.05)
  arc A47 (-0.9084, -85.05) -> (-1.007, -85.1333) centre (-0.9084, -85.15) ccw
  line L16 (12.65, 2) -> (-3.5, 2)
  line L17 (-3.5, 2) -> (-3.5, -87.05)
  line L18 (-3.5, -87.05) -> (12.65, -87.05)
  line L19 (12.65, -87.05) -> (12.65, 2)
  line L20 (12.65, -87.05) -> (-3.5, -87.05)
  line L21 (-3.5, -87.05) -> (-3.5, 2)
  line L22 (-3.5, 2) -> (12.65, 2)
  line L23 (12.65, 2) -> (12.65, -87.05)
extrude "Extrude2" add sketch "Sketch2" along normal blind 1 contours A0 A1 L0 A2 A3 A4 L1 A5 A6 A7 L2 A8 A9 A10 L3 A11 | L4 A12 A13 A14 L5 A15 A16 A17 L6 A18 A19 A20 L7 A21 A22 A23 | L8 A24 A25 A26 L9 A27 A28 A29 L10 A30 A31 A32 L11 A33 A34 A35 | A36 A37 L12 A38 A39 A40 L13 A41 A42 A43 L14 A44 A45 A46 L15 A47 | L16 L17 L18 L19 L20 L21 L22 L23
equation "d14 = d12"
equation "d26 = 1.55 mm + 0.025 mm"
equation "d29 = d13"
equation "d30 = d13"
equation "d32 = d13"
